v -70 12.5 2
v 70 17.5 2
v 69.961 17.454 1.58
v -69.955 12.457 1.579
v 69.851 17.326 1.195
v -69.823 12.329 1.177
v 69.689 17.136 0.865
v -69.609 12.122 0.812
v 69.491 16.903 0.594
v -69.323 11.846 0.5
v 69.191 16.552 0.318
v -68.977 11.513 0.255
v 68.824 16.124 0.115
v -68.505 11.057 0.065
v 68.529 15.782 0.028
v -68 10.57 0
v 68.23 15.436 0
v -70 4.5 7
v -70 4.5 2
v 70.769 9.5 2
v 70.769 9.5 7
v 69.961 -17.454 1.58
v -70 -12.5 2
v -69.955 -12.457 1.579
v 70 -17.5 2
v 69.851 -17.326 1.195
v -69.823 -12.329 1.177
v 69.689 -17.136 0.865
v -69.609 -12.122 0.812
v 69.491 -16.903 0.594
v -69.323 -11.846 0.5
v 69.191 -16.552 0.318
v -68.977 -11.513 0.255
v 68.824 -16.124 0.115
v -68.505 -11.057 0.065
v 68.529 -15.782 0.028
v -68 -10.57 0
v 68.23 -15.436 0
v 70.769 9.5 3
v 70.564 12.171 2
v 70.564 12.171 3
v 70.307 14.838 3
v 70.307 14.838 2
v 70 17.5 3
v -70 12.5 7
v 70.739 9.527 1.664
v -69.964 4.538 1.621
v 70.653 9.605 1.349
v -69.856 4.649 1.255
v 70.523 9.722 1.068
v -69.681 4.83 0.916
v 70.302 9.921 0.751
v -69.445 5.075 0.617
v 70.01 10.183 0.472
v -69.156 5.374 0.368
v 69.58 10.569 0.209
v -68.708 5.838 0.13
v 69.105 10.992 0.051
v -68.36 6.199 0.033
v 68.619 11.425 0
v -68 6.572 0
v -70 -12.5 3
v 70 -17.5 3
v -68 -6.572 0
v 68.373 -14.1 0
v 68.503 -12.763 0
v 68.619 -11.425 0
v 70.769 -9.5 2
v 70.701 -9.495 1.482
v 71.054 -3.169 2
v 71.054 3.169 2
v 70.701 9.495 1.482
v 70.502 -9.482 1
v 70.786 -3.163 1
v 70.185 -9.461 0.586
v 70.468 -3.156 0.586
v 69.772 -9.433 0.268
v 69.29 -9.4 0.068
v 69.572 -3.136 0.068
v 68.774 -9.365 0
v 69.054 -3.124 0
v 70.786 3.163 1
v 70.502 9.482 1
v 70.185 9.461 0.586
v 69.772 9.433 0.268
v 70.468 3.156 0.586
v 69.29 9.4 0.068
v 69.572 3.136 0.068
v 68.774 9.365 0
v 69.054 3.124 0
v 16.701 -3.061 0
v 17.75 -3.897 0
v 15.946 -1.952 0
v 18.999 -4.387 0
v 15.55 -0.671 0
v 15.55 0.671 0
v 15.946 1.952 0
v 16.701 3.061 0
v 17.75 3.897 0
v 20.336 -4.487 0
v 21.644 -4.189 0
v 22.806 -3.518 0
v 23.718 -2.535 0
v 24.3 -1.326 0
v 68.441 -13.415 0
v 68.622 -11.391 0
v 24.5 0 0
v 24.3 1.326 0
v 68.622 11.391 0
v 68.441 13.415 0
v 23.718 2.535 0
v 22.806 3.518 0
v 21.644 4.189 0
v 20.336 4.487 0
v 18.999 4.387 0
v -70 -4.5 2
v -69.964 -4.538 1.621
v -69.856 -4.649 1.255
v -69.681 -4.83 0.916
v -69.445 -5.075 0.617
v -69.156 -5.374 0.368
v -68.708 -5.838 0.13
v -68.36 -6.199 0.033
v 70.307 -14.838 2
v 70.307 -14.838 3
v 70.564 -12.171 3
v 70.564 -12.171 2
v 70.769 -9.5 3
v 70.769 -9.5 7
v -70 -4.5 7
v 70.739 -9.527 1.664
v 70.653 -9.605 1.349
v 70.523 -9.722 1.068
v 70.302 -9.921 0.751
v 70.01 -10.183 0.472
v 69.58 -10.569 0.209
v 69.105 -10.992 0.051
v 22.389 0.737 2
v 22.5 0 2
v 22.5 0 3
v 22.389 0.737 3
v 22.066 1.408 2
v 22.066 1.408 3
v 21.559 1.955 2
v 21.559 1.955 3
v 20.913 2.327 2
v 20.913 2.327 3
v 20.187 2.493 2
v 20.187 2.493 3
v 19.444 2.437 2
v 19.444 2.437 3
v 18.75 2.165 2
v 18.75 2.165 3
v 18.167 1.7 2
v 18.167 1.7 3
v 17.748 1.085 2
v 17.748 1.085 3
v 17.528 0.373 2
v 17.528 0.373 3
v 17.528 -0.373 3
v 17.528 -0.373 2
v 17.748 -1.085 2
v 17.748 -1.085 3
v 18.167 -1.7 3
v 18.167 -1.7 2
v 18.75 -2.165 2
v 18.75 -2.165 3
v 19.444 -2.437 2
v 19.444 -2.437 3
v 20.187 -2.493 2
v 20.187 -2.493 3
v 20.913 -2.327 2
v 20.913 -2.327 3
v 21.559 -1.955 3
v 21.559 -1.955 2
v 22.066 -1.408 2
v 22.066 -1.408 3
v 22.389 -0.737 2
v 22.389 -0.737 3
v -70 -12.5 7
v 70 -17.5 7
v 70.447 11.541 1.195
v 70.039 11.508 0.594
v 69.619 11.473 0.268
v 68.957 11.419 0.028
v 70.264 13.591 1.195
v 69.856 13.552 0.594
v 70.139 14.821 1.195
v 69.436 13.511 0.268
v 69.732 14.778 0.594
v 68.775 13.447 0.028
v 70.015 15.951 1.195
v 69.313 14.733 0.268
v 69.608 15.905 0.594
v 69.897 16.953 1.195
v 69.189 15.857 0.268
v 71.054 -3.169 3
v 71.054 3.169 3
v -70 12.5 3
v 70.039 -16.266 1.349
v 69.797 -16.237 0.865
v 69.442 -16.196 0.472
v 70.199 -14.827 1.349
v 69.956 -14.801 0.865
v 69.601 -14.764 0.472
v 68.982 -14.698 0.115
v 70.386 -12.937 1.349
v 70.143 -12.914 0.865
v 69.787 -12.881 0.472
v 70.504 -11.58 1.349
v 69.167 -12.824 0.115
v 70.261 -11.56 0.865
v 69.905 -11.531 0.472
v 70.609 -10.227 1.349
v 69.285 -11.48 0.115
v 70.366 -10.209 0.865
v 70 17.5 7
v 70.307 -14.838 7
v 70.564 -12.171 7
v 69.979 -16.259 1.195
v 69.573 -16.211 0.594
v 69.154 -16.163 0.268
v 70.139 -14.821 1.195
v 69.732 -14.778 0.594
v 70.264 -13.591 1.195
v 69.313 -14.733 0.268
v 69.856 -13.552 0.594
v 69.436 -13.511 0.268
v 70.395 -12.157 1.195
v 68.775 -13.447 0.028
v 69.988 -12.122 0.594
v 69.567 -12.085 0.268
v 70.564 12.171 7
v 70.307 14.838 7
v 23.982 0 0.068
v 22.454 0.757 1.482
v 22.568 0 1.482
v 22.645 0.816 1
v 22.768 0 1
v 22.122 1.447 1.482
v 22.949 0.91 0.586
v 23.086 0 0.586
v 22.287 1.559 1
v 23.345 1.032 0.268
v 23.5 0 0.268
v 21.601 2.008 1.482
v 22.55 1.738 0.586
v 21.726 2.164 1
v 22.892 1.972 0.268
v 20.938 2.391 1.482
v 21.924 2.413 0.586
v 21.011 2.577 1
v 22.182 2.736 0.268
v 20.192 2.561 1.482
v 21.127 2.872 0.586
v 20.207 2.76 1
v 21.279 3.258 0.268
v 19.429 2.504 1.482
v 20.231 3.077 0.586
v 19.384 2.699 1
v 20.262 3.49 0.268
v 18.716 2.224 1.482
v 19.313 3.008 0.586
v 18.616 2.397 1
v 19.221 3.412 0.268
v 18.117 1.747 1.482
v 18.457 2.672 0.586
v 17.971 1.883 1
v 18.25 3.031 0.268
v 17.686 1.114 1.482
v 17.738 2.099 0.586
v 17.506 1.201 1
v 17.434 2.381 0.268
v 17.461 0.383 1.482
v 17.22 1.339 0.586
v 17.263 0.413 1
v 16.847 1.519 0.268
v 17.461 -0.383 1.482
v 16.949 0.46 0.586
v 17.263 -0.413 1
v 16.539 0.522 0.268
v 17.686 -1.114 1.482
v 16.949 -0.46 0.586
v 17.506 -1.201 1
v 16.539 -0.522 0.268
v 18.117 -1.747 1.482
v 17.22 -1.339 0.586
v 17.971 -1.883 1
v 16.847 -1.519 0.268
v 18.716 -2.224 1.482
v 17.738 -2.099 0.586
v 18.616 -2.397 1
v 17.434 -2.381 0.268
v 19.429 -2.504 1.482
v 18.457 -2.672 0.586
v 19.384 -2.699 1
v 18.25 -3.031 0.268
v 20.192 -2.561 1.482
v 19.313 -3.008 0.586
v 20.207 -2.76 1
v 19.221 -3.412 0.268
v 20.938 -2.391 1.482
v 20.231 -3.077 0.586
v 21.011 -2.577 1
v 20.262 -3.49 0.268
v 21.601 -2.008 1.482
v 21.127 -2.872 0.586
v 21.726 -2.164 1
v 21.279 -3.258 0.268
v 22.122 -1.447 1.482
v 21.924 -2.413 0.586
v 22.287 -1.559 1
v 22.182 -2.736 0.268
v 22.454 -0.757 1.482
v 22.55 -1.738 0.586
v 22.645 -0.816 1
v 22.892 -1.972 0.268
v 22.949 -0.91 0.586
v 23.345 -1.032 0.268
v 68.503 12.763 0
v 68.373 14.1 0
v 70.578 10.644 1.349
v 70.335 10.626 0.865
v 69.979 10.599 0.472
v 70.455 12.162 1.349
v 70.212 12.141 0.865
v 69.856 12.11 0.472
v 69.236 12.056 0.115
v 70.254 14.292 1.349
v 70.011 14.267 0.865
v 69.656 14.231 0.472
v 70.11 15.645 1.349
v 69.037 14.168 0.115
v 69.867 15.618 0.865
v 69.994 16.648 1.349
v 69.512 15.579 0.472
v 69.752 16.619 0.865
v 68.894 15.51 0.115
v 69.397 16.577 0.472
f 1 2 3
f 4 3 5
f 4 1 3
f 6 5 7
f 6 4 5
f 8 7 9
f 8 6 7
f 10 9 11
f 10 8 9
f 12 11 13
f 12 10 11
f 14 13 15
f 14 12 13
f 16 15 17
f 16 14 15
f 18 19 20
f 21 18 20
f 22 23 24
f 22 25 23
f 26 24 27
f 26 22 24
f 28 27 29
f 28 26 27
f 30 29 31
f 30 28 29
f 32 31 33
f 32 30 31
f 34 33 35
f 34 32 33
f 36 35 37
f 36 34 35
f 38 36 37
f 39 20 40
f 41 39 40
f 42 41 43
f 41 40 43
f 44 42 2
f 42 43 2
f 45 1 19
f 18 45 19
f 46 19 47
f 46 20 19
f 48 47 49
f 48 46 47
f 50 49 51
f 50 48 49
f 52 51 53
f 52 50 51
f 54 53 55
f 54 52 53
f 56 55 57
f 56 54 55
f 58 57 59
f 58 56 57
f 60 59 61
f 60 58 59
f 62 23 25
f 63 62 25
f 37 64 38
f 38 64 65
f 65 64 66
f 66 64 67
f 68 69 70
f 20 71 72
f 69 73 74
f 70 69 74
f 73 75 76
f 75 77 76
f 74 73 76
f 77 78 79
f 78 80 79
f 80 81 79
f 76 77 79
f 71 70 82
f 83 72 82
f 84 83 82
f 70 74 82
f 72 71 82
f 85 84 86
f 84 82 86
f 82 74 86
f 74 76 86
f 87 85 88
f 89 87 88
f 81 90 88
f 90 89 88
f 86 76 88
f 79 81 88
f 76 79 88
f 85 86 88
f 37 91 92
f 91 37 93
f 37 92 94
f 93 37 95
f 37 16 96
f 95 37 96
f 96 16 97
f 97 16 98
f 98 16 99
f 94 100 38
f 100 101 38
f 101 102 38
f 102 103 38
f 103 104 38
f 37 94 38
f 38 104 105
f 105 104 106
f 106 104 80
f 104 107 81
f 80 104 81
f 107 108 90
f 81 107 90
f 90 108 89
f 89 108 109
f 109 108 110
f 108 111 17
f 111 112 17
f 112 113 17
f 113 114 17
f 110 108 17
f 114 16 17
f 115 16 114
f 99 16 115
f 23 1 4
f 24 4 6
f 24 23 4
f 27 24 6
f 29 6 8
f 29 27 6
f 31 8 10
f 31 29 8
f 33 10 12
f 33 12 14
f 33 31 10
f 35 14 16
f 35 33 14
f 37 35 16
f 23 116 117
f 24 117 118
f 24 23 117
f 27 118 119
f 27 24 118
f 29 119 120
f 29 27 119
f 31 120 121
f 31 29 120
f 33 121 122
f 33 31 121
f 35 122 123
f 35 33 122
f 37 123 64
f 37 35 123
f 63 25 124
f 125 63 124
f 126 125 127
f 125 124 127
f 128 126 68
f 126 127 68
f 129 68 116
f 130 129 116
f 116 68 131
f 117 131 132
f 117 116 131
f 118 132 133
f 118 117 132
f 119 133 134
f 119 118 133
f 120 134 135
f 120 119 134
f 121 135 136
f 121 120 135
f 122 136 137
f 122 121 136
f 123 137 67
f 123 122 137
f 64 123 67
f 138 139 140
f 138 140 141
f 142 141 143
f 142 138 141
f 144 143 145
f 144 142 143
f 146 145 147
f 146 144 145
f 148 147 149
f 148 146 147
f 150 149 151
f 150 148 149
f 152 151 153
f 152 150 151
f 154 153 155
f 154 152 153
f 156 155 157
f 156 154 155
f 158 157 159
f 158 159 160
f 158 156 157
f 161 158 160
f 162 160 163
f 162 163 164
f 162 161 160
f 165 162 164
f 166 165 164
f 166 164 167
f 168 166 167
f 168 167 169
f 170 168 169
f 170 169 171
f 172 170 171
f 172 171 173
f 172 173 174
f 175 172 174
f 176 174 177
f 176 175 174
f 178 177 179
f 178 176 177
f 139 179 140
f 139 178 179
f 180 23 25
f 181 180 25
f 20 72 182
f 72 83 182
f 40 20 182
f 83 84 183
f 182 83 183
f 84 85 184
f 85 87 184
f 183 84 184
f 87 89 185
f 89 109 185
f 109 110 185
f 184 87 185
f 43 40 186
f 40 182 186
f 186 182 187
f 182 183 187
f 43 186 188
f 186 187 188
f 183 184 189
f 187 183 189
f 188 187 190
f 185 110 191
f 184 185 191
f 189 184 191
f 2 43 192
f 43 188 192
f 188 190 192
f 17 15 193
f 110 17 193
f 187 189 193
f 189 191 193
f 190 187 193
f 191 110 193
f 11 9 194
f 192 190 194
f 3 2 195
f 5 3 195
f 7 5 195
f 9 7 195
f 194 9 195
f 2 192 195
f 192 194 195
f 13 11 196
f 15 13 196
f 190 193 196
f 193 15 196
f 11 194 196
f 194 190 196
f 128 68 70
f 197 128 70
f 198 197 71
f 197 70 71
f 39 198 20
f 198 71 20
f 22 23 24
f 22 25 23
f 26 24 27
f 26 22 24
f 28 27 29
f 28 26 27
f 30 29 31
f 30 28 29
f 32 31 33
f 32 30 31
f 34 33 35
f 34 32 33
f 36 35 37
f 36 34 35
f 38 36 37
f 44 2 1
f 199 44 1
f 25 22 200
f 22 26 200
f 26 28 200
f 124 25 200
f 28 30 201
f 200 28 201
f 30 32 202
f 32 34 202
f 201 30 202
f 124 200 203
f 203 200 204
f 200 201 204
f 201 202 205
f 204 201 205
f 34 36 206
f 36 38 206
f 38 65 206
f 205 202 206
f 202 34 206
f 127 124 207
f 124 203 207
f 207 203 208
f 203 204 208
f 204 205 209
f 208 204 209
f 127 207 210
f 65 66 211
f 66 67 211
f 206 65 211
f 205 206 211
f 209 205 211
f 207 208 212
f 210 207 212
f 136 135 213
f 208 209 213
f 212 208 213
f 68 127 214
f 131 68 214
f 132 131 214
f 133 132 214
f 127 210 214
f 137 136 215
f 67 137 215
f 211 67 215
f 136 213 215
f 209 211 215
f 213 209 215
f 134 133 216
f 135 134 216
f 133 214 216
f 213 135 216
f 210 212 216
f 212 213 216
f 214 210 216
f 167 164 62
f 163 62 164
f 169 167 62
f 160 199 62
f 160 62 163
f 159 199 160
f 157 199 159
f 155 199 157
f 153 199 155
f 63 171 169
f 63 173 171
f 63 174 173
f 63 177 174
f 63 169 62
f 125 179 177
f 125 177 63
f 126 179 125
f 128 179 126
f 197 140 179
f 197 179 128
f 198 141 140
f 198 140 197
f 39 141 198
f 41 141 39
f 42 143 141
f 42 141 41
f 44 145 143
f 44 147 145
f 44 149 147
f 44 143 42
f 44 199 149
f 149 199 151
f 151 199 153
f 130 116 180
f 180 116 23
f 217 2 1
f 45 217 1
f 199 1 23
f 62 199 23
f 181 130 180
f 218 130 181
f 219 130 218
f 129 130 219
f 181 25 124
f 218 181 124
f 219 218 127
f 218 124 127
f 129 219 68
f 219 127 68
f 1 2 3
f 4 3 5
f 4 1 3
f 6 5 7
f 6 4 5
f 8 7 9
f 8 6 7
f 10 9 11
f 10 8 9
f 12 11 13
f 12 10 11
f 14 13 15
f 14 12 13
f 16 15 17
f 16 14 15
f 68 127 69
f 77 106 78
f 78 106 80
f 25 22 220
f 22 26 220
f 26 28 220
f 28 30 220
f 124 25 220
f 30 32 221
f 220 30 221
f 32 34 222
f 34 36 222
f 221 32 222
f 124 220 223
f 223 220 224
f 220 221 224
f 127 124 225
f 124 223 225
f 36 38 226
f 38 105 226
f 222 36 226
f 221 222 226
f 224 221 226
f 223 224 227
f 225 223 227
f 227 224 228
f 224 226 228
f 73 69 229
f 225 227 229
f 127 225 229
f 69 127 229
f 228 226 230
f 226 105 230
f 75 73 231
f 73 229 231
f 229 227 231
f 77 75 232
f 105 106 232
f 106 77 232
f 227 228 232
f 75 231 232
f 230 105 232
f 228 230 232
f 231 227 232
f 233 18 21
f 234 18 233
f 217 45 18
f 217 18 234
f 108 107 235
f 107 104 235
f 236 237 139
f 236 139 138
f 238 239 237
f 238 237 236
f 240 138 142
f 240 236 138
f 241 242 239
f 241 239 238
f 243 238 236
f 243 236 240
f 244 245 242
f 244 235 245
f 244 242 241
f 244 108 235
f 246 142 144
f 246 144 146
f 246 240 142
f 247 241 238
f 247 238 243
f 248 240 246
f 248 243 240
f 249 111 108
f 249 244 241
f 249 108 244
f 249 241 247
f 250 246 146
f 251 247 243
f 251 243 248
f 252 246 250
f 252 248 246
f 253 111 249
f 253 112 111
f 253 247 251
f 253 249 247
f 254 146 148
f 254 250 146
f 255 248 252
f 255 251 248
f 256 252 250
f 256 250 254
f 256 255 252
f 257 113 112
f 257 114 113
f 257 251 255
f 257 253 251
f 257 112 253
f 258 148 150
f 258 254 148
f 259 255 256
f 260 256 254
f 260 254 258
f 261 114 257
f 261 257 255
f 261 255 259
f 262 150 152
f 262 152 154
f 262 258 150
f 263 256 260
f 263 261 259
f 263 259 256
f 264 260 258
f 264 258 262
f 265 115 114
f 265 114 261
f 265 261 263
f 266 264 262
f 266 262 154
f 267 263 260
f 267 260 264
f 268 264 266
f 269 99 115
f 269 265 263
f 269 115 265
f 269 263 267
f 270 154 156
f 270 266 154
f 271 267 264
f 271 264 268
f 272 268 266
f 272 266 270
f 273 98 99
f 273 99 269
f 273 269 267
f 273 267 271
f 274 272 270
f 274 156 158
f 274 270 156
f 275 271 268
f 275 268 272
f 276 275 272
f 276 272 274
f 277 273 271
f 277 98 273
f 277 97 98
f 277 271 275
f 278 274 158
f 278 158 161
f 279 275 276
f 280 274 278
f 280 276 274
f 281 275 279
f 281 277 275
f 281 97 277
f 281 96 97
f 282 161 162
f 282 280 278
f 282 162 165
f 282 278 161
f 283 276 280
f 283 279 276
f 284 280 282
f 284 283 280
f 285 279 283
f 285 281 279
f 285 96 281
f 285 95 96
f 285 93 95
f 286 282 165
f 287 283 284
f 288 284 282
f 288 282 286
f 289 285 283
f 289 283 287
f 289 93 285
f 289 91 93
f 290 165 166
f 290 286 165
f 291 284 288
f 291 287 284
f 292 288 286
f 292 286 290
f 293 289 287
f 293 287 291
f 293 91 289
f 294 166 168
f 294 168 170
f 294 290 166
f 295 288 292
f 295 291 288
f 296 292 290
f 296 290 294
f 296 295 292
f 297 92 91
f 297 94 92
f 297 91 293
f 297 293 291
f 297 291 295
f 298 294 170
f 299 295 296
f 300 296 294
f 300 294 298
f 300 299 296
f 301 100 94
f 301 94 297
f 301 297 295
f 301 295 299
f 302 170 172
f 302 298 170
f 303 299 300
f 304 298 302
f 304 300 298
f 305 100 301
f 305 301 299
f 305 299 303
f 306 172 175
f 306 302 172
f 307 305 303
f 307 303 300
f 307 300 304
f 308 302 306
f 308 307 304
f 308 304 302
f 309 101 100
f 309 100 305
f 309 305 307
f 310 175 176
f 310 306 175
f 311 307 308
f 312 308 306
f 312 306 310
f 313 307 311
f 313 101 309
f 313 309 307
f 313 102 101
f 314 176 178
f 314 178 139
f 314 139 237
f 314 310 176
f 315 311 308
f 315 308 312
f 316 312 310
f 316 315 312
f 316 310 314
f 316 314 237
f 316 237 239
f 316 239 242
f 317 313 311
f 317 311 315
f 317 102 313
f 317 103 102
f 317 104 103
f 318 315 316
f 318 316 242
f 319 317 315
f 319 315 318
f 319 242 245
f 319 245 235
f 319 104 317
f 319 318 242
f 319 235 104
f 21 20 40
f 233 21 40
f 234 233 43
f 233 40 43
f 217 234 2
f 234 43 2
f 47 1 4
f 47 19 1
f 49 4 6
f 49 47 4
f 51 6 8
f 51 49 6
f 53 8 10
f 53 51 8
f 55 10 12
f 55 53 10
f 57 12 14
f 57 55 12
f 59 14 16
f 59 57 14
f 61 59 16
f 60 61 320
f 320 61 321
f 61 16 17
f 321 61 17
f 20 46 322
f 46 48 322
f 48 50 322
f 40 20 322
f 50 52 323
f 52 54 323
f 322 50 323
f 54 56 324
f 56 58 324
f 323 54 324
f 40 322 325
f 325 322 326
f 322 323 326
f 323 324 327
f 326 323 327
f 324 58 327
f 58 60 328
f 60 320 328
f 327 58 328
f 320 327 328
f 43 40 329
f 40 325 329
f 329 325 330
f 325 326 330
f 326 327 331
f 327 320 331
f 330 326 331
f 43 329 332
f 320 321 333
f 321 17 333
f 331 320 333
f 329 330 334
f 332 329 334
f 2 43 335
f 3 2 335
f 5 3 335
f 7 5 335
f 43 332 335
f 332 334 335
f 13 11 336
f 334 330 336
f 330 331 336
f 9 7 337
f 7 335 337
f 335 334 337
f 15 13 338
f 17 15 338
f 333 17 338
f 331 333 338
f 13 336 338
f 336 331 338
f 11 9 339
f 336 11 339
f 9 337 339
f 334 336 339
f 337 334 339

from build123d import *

# Parameters (mm, degrees)
F1_DEPTH = 7
F0_R     = 2.5
F2_DEPTH = 3
F3_R     = 2
F3_2_R   = 2
F3_3_R   = 2


with BuildPart() as f1:
    # F0 (on Top) → F1 (new body)
    with BuildSketch(Plane.XY):
        with BuildLine():
            Line((70, 17.5), (-70, 12.5))
            Line((-70, 12.5), (-70, 4.5))
            Line((-70, 4.5), (70.7693148381, 9.5))
            ThreePointArc((70.7693148381, 9.5), (70.4416321419, 13.5054789375), (70, 17.5))
        make_face()
    extrude(amount=F1_DEPTH)

    # F3#2
    f3_2_edges = [f1.edges().sort_by_distance(p)[0] for p in [
        (0, 15, 0),
        (-70, 8.5, 0),
        (0.384657, 7, 0),
        (70.441632, 13.505479, 0),
    ]]
    fillet(f3_2_edges, radius=F3_2_R)


with BuildPart() as f1b:
    # F0 (on Top) → F1, piece 2 (new body)
    with BuildSketch(Plane.XY):
        with BuildLine():
            Line((70.7693148381, -9.5), (-70, -4.5))
            Line((-70, -4.5), (-70, -12.5))
            Line((-70, -12.5), (70, -17.5))
            ThreePointArc((70, -17.5), (70.4416321419, -13.5054789375), (70.7693148381, -9.5))
        make_face()
    extrude(amount=F1_DEPTH)

    # F3#3
    f3_3_edges = [f1b.edges().sort_by_distance(p)[0] for p in [
        (0, -15, 0),
        (0.384657, -7, 0),
        (-70, -8.5, 0),
        (70.441632, -13.505479, 0),
    ]]
    fillet(f3_3_edges, radius=F3_3_R)


with BuildPart() as f2:
    # F0 (on Top) → F2 (new body)
    with BuildSketch(Plane.XY):
        with BuildLine():
            Line((70, 17.5), (-70, 12.5))
            Line((-70, 12.5), (-70, 4.5))
            Line((-70, 4.5), (70.7693148381, 9.5))
            ThreePointArc((70.7693148381, 9.5), (70.4416321419, 13.5054789375), (70, 17.5))
        make_face()
        with BuildLine():
            Line((70.7693148381, 9.5), (-70, 4.5))
            Line((-70, 4.5), (-70, -4.5))
            Line((-70, -4.5), (70.7693148381, -9.5))
            ThreePointArc((70.7693148381, -9.5), (71.0895105952, 0), (70.7693148381, 9.5))
        make_face()
        with Locations((20, 0)):
            Circle(F0_R, mode=Mode.SUBTRACT)
        with BuildLine():
            Line((70.7693148381, -9.5), (-70, -4.5))
            Line((-70, -4.5), (-70, -12.5))
            Line((-70, -12.5), (70, -17.5))
            ThreePointArc((70, -17.5), (70.4416321419, -13.5054789375), (70.7693148381, -9.5))
        make_face()
    extrude(amount=F2_DEPTH)

    # F3
    f3_edges = [f2.edges().sort_by_distance(p)[0] for p in [
        (0, 15, 0),
        (-70, 0, 0),
        (0, -15, 0),
        (71.089511, 0, 0),
        (17.5, 0, 0),
    ]]
    fillet(f3_edges, radius=F3_R)


solid = Compound([f1.part, f1b.part, f2.part])
